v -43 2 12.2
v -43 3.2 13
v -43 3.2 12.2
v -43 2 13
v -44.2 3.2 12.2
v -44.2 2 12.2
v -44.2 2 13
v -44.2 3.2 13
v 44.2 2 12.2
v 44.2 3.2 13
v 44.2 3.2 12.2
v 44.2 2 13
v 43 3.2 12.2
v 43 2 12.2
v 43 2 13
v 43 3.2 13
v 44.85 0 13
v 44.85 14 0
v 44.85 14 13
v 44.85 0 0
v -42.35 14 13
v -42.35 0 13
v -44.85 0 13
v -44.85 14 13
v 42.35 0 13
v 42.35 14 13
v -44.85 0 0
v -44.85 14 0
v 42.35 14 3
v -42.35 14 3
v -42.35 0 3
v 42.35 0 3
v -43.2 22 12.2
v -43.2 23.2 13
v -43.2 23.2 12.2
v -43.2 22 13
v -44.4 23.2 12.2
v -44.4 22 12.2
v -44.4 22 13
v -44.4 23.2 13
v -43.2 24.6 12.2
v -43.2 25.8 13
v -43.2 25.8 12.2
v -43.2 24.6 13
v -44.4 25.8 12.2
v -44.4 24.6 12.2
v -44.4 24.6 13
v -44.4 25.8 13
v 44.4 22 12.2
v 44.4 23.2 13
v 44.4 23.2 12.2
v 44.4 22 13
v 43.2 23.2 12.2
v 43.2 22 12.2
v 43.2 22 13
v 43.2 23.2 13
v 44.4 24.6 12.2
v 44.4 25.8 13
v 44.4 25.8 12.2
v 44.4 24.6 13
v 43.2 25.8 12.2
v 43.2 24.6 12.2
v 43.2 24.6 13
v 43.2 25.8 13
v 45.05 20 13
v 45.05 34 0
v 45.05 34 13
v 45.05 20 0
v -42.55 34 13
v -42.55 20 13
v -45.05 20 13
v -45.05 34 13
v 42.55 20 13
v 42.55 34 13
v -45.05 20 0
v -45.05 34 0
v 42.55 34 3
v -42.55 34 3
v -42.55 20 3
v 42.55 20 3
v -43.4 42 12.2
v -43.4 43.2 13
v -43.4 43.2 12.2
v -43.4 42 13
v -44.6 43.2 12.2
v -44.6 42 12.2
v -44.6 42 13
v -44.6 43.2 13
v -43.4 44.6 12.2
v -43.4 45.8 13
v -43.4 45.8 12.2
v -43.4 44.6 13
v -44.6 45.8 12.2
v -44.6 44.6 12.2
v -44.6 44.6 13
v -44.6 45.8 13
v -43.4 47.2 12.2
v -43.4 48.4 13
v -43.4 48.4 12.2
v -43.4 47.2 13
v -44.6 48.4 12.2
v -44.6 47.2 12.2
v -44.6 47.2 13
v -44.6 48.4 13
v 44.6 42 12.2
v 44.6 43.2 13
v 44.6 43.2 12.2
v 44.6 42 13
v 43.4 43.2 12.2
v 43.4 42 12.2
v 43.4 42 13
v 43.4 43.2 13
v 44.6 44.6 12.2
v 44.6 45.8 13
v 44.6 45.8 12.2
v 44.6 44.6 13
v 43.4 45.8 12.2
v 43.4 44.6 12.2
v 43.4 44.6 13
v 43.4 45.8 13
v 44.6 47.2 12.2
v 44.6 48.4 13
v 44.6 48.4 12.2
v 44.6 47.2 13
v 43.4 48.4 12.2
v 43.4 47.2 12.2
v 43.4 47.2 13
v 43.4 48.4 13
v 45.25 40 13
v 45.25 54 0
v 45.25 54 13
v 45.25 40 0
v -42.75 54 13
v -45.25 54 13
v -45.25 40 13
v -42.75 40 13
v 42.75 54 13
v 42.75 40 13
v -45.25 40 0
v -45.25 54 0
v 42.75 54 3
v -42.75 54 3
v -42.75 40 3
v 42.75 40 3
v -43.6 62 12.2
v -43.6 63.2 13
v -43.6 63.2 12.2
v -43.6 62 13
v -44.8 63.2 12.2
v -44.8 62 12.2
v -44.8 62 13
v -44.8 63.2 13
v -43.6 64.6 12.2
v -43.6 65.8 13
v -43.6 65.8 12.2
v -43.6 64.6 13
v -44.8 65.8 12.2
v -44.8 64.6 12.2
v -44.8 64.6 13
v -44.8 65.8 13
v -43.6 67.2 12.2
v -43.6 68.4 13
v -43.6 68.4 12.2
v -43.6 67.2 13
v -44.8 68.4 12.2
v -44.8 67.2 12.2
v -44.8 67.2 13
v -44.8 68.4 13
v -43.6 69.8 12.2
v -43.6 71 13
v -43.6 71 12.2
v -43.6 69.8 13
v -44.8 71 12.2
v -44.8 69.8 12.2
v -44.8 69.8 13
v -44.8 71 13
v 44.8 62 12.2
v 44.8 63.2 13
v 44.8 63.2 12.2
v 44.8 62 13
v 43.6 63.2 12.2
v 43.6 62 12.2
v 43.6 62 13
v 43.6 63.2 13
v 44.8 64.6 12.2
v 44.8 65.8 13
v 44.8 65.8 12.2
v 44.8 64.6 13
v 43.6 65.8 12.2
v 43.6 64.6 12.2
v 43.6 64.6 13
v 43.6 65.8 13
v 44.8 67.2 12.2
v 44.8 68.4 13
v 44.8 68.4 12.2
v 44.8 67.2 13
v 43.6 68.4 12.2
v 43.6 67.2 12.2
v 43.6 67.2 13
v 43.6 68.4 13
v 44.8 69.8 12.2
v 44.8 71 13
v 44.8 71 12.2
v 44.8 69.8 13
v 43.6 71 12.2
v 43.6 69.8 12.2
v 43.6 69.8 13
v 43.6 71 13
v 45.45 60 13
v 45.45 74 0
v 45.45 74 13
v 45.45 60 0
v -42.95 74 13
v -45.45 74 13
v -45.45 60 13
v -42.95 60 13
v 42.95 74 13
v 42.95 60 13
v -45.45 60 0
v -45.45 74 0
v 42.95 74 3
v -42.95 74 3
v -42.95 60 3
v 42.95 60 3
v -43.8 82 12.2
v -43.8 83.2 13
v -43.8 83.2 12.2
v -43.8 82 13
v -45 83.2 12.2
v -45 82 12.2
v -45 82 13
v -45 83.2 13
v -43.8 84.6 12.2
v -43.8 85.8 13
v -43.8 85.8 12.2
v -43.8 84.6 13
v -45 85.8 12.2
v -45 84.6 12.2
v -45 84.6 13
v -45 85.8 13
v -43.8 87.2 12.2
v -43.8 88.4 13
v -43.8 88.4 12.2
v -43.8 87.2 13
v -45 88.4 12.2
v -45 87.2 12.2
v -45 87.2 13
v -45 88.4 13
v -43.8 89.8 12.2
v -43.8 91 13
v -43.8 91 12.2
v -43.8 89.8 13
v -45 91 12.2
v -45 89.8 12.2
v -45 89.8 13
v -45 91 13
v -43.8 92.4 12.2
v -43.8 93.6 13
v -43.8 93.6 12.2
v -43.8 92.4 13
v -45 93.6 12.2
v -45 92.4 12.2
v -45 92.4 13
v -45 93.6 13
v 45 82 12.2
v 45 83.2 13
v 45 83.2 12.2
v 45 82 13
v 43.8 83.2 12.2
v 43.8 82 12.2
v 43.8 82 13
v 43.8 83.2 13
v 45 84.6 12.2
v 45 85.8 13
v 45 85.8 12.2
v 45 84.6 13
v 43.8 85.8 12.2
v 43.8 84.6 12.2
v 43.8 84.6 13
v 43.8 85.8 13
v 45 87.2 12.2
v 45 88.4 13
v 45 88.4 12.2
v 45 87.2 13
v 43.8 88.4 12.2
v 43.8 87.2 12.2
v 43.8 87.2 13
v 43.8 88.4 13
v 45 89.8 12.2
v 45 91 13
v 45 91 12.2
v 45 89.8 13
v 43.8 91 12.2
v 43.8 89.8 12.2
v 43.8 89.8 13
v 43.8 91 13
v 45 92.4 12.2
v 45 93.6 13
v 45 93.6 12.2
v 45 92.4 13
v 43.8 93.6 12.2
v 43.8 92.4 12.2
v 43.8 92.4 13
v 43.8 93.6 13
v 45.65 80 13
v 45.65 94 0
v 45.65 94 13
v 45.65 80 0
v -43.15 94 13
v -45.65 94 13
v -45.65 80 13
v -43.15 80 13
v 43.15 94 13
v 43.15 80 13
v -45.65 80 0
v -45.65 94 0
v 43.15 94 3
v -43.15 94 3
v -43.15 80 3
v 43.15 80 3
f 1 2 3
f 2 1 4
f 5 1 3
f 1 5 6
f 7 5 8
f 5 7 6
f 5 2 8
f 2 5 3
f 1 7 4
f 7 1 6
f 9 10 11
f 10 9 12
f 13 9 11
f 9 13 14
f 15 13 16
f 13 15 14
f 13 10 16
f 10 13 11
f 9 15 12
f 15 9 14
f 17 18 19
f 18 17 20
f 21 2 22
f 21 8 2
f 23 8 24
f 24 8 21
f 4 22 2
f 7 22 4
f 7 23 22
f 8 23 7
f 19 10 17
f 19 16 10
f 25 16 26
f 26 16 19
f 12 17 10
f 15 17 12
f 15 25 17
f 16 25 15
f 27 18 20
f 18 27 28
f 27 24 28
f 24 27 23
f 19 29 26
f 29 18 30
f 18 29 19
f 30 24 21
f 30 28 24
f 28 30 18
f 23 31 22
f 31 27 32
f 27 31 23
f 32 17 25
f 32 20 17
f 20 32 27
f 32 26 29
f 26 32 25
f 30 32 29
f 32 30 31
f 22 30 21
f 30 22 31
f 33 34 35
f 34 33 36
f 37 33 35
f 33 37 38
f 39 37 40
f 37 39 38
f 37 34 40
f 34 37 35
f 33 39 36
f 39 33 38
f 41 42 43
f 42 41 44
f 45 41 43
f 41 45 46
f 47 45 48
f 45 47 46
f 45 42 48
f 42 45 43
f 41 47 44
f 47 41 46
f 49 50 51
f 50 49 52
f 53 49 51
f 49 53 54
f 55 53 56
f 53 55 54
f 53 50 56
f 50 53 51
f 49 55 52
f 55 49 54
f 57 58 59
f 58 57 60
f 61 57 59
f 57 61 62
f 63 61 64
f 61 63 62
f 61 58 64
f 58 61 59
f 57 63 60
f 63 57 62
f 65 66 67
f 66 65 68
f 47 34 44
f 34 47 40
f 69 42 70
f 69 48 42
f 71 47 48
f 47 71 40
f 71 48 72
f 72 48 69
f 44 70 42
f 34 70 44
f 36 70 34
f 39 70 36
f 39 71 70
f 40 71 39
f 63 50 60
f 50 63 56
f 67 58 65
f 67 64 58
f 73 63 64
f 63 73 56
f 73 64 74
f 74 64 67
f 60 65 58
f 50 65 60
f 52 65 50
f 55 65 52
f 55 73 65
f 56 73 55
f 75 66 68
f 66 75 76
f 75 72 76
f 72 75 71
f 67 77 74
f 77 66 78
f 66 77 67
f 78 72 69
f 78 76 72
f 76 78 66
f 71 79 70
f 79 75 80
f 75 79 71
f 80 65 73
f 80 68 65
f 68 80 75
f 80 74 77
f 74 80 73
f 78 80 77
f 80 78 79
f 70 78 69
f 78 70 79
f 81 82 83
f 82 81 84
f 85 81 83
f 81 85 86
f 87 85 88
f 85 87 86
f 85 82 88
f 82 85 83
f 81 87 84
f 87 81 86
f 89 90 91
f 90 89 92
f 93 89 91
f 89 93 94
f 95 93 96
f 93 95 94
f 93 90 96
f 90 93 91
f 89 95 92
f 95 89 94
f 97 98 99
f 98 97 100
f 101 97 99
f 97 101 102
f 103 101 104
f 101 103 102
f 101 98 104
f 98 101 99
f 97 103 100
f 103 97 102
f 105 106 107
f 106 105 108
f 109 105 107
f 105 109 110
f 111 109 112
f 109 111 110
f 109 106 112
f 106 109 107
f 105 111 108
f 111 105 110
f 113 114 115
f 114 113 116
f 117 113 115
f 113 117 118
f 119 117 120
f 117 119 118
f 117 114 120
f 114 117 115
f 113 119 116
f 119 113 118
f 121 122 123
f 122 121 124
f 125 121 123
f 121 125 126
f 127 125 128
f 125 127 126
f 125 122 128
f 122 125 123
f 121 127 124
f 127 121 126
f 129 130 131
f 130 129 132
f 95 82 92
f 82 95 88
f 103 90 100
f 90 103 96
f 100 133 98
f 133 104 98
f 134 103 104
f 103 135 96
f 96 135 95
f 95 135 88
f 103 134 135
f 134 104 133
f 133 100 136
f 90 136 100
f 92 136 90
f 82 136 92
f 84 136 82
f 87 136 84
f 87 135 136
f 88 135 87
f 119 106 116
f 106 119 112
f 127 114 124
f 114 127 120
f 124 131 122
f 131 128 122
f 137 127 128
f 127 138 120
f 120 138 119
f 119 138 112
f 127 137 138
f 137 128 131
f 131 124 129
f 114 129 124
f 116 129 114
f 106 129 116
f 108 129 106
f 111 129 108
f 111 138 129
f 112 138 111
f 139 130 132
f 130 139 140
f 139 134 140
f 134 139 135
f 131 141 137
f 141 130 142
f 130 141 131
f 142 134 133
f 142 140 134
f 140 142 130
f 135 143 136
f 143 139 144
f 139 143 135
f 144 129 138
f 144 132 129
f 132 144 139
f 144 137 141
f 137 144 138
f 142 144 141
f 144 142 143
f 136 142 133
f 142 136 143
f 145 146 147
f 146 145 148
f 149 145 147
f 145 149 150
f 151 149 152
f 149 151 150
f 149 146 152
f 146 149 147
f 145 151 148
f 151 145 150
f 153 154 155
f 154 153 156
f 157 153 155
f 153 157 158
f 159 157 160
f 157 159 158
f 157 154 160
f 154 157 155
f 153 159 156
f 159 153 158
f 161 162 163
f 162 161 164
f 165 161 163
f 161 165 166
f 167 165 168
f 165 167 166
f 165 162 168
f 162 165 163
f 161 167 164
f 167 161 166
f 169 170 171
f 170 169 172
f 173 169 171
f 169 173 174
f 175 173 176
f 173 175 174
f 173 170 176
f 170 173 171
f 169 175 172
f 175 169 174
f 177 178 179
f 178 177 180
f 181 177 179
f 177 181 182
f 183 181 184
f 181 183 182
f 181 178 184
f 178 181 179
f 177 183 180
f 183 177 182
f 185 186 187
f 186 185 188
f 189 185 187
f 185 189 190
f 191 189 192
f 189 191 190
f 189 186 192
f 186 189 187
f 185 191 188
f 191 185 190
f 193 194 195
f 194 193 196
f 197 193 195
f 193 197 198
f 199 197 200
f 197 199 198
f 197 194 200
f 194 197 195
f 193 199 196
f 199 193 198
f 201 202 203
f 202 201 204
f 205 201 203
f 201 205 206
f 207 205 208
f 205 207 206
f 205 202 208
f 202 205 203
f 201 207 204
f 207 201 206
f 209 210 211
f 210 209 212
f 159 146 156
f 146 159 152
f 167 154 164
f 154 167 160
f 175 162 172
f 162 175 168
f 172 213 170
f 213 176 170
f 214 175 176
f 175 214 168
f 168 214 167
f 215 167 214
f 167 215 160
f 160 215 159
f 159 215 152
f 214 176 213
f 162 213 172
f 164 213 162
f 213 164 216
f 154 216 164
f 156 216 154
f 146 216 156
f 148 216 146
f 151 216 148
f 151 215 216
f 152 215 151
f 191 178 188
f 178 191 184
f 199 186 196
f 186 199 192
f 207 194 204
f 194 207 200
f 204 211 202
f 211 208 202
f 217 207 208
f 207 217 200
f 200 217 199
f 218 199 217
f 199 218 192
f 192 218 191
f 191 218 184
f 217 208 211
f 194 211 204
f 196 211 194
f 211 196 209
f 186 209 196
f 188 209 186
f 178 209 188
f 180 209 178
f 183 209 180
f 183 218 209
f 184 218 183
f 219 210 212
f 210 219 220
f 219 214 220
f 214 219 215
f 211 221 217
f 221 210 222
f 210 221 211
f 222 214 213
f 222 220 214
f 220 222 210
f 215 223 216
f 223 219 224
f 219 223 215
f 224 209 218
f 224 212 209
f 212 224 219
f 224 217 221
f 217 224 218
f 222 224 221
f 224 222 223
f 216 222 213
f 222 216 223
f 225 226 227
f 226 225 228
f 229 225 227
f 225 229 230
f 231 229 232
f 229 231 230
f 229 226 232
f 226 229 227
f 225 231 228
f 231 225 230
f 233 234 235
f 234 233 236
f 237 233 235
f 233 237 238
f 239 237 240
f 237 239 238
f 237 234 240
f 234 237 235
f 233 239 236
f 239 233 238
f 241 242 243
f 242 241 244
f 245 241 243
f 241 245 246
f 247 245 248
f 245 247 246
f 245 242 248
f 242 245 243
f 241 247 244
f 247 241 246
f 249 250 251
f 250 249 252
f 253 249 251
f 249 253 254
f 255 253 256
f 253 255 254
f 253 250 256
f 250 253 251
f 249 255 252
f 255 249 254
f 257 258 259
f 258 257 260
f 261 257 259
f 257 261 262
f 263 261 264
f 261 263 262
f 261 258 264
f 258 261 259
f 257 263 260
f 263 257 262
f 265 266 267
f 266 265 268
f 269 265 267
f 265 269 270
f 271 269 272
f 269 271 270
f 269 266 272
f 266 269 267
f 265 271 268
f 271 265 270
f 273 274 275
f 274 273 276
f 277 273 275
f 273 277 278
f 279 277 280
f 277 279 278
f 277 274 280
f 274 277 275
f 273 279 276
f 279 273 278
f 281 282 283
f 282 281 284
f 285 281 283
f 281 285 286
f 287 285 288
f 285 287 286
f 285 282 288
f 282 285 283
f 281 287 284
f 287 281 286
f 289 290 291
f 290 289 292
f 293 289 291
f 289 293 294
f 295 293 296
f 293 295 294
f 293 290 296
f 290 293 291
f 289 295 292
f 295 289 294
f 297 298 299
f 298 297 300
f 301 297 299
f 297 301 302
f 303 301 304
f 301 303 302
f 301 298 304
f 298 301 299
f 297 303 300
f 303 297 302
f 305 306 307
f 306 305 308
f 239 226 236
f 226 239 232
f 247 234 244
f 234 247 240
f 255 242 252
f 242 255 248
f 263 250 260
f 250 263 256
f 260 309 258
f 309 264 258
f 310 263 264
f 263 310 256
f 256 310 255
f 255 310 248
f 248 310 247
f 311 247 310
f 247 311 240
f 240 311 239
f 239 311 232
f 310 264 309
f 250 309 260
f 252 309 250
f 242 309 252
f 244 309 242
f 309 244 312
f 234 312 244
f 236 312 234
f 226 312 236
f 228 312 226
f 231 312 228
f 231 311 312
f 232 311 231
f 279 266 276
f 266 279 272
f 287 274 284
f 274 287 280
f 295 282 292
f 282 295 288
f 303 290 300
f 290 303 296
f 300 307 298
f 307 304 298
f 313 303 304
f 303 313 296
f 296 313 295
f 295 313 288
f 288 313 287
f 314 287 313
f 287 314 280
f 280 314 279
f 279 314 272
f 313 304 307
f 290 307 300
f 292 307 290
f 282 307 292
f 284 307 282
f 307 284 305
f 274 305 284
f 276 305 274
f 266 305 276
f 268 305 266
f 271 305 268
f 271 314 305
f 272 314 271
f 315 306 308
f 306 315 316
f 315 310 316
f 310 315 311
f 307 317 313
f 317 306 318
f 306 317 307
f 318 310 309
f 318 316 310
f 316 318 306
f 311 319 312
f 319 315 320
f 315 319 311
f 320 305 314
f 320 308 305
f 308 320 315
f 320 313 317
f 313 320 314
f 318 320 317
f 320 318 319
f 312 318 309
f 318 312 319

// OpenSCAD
// file: ../owon_tray_common.scad
// owon_tray_common.scad — shared dimensions for the OWON SPM8104 top tray.
//
// Measured on the actual unit (the datasheet's 82 mm width is WRONG):
//   lid width  84.30 mm  (calipers)
//   lid length ~226 mm   (flat all the way to the plastic front bezel)
//   height     142 mm    (spec)
//   venting    rear fan + side slots low on the case — skirts stay well above
//
// The 84.30 mm width is the happy accident that makes this work: a 2-cell
// Clickfinity plate is exactly 84.00 mm, so it sits flush with ~0.15 mm of case
// showing per side. 5 cells (210 mm) fits the length with ~16 mm to spare.

/* [Case] */
CASE_W   = 84.30;  // measured lid width
CASE_CLR = 0.40;   // total slip clearance across the WIDTH. Confirmed on the
                   //   printed part — the width fit is fine, leave it alone.
CASE_L   = 226.00; // measured lid LENGTH, rear edge -> front bezel. THE frame
                   //   must clear this between its end lips. CONFIRM BY HAND
                   //   before printing — see the note on RAIL_LEN below.
CASE_L_CLR = 1.50; // total slip clearance along the LENGTH. Generous on purpose:
                   //   a little front-to-back slide is fine, seizing is not.

/* [Tray] */
GX = 2;            // cells across (84.00 mm — flush on the lid)
GY = 5;            // cells deep  (210 mm)
PLATE_H_ = 4.00;   // must match PLATE_H in lib/clickfinity.scad

/* [Clamp rail] */
SKIRT_T     = 2.50;  // skirt wall thickness
SKIRT_D     = 20.0;  // how far the skirt drops down the case side.
                     //   Keep SHORT — the side vents sit lower down the case.
// NOTE: the rail supports the plate from BELOW, it does not hook over it.
// A Gridfinity bin is 41.5 mm in a 42 mm cell — only 0.25 mm of plate rim per
// side. There is nothing to clamp over: any inward flange lands on top of the
// outer-row bins and stops them seating. So: a lip under the plate edge, and an
// upstand beside it.
LIP_IN   = 2.00;   // how far the lip reaches inward under the plate edge
LIP_T    = 1.50;   // lip thickness — the plate rides this far above the lid

// RAIL_LEN is DERIVED (see bottom) — do not hand-set it.
//
// v1.0.3 shipped MOUNT_L = 228 as the frame's OUTER length, sized against the
// ~9" case. That was the wrong end of the part: the two end-bars eat END_BAR_T
// each, so the CLEAR SPAN the case actually has to fit into was only
// 228 - 2*5 = 218 mm, against a 226 mm case. The end lips came down flat on the
// case top ~4 mm in from each end and the frame perched instead of dropping over.
//
// The clear span is now driven by CASE_L, and the end-bars are added OUTSIDE it,
// so the lips land past the case edges by construction.

/* [Front/back end-bars] */
// The two side jaws are TIED TOGETHER by a bar across each end — this is what
// makes the screw clamp work at all: the bar carries the screw reaction from one
// jaw to the other (closed loop). Without it, a side screw just shoves its own
// jaw off the case. Each bar also carries a SHALLOW downturn lip that hooks the
// front/back top edge (short, so it clears the front display / rear fan).
END_BAR_T = 5.00;  // [3:0.5:10] end-bar thickness along the length (rigidity)
END_LIP_D = 5.00;  // [3:0.5:12] how far the front/back lip drops over the edge

// (No clamp hardware — this is a passive drop-over frame. Side walls hug the
// case, front/back lips stop the slide, gravity holds it down. The plate is
// permanent — you swap BINS, not the plate — so it's simply bonded into the
// frame at assembly. No retention mechanism needed.)

// Derived
PLATE_W  = GX*42;
PLATE_L  = GY*42;
SKIRT_IN = CASE_W/2 + CASE_CLR/2;   // inner face of the skirt
SKIRT_OUT= SKIRT_IN + SKIRT_T;

INNER_L  = CASE_L + CASE_L_CLR;     // clear span between the end lips
RAIL_LEN = INNER_L + 2*END_BAR_T;   // overall frame length
MOUNT_L  = RAIL_LEN;                // back-compat alias; RAIL_LEN is the truth
// main file
// owon_fit_gauge.scad — clearance gauge for the OWON tray frame. PRINT THIS FIRST.
//
// Five stubby U-channels, each a 14 mm-long slice of the frame's skirt at a
// different clearance. Prints in minutes instead of two hours, and tells you the
// one number the frame actually depends on.
//
// The v1.0.3 frame shipped with CASE_CLR = 0.40 mm — 0.20 mm per side on an
// 84.30 mm case. That is a press fit, not a drop-over: PETG shrinks ~0.4 %
// (~0.34 mm across this span) and internal dimensions print undersize on top of
// that, so the opening came out at or below the case and would not go on.
// Rather than guess a replacement, measure it.
//
// HOW TO USE
//   1. Print flat, as modelled. No supports. Same filament and profile as the
//      real frame — shrinkage is exactly what you're measuring.
//   2. Count the notches on each gauge's wall tops: 1 = tightest, 5 = loosest.
//   3. Try each over the top edge of the unit, in order.
//   4. Keep the LOOSEST one that still feels snug side-to-side — a tray of
//      adapters wants no wobble, but it has to drop on one-handed.
//   5. Tell me the notch count and I'll set CASE_CLR and re-cut the frame.
//
// If even notch 5 won't go on, the case is wider than 84.30 mm where the skirt
// sits — measure across the case 20 mm BELOW the top, at its widest (include any
// rim, seam or screw head) and give me that number instead.

include <../owon_tray_common.scad>
$fn = 32;

/* [Gauge] */
// Total added clearance for each gauge, tightest first. Notch count = index.
CLEARS     = [0.40, 0.80, 1.20, 1.60, 2.00];
GAUGE_LEN  = 14.0;   // [10:1:30] mm along the case — long enough to feel square
GAUGE_DEPT = 10.0;   // [6:1:20] mm skirt depth. Shorter than the real 20 mm
                     //   (SKIRT_D) purely to save print time; the fit is set by
                     //   the span, not the depth.
BAR_T      = 3.0;    // [2:0.5:5] mm bar joining the two walls
NOTCH      = 1.2;    // [0.8:0.1:2.0] mm notch width
GAP        = 6.0;    // [4:1:12] mm bed spacing between gauges

// One gauge: a U printed OPENING-UP (bar on the bed, walls rising), so there is
// nothing to bridge and no supports. Flip it to drop it over the case.
module gauge(clr, notches) {
    w  = CASE_W + clr;          // the clear span under test
    ow = w + 2*SKIRT_T;
    h  = BAR_T + GAUGE_DEPT;
    difference() {
        translate([-ow/2, 0, 0]) cube([ow, GAUGE_LEN, h]);
        // the opening
        translate([-w/2, -1, BAR_T]) cube([w, GAUGE_LEN + 2, GAUGE_DEPT + 1]);
        // tally notches cut into BOTH wall tops, so it reads either way up
        for (s = [-1, 1], i = [0:notches-1])
            translate([s*(w + SKIRT_T)/2 - NOTCH/2,
                       2 + i*(NOTCH + 1.4),
                       h - 0.8])
                cube([NOTCH, NOTCH, 1.2]);
    }
}

// Lay them out tightest-to-loosest along +Y.
for (i = [0:len(CLEARS)-1])
    translate([0, i*(GAUGE_LEN + GAP), 0]) gauge(CLEARS[i], i + 1);
